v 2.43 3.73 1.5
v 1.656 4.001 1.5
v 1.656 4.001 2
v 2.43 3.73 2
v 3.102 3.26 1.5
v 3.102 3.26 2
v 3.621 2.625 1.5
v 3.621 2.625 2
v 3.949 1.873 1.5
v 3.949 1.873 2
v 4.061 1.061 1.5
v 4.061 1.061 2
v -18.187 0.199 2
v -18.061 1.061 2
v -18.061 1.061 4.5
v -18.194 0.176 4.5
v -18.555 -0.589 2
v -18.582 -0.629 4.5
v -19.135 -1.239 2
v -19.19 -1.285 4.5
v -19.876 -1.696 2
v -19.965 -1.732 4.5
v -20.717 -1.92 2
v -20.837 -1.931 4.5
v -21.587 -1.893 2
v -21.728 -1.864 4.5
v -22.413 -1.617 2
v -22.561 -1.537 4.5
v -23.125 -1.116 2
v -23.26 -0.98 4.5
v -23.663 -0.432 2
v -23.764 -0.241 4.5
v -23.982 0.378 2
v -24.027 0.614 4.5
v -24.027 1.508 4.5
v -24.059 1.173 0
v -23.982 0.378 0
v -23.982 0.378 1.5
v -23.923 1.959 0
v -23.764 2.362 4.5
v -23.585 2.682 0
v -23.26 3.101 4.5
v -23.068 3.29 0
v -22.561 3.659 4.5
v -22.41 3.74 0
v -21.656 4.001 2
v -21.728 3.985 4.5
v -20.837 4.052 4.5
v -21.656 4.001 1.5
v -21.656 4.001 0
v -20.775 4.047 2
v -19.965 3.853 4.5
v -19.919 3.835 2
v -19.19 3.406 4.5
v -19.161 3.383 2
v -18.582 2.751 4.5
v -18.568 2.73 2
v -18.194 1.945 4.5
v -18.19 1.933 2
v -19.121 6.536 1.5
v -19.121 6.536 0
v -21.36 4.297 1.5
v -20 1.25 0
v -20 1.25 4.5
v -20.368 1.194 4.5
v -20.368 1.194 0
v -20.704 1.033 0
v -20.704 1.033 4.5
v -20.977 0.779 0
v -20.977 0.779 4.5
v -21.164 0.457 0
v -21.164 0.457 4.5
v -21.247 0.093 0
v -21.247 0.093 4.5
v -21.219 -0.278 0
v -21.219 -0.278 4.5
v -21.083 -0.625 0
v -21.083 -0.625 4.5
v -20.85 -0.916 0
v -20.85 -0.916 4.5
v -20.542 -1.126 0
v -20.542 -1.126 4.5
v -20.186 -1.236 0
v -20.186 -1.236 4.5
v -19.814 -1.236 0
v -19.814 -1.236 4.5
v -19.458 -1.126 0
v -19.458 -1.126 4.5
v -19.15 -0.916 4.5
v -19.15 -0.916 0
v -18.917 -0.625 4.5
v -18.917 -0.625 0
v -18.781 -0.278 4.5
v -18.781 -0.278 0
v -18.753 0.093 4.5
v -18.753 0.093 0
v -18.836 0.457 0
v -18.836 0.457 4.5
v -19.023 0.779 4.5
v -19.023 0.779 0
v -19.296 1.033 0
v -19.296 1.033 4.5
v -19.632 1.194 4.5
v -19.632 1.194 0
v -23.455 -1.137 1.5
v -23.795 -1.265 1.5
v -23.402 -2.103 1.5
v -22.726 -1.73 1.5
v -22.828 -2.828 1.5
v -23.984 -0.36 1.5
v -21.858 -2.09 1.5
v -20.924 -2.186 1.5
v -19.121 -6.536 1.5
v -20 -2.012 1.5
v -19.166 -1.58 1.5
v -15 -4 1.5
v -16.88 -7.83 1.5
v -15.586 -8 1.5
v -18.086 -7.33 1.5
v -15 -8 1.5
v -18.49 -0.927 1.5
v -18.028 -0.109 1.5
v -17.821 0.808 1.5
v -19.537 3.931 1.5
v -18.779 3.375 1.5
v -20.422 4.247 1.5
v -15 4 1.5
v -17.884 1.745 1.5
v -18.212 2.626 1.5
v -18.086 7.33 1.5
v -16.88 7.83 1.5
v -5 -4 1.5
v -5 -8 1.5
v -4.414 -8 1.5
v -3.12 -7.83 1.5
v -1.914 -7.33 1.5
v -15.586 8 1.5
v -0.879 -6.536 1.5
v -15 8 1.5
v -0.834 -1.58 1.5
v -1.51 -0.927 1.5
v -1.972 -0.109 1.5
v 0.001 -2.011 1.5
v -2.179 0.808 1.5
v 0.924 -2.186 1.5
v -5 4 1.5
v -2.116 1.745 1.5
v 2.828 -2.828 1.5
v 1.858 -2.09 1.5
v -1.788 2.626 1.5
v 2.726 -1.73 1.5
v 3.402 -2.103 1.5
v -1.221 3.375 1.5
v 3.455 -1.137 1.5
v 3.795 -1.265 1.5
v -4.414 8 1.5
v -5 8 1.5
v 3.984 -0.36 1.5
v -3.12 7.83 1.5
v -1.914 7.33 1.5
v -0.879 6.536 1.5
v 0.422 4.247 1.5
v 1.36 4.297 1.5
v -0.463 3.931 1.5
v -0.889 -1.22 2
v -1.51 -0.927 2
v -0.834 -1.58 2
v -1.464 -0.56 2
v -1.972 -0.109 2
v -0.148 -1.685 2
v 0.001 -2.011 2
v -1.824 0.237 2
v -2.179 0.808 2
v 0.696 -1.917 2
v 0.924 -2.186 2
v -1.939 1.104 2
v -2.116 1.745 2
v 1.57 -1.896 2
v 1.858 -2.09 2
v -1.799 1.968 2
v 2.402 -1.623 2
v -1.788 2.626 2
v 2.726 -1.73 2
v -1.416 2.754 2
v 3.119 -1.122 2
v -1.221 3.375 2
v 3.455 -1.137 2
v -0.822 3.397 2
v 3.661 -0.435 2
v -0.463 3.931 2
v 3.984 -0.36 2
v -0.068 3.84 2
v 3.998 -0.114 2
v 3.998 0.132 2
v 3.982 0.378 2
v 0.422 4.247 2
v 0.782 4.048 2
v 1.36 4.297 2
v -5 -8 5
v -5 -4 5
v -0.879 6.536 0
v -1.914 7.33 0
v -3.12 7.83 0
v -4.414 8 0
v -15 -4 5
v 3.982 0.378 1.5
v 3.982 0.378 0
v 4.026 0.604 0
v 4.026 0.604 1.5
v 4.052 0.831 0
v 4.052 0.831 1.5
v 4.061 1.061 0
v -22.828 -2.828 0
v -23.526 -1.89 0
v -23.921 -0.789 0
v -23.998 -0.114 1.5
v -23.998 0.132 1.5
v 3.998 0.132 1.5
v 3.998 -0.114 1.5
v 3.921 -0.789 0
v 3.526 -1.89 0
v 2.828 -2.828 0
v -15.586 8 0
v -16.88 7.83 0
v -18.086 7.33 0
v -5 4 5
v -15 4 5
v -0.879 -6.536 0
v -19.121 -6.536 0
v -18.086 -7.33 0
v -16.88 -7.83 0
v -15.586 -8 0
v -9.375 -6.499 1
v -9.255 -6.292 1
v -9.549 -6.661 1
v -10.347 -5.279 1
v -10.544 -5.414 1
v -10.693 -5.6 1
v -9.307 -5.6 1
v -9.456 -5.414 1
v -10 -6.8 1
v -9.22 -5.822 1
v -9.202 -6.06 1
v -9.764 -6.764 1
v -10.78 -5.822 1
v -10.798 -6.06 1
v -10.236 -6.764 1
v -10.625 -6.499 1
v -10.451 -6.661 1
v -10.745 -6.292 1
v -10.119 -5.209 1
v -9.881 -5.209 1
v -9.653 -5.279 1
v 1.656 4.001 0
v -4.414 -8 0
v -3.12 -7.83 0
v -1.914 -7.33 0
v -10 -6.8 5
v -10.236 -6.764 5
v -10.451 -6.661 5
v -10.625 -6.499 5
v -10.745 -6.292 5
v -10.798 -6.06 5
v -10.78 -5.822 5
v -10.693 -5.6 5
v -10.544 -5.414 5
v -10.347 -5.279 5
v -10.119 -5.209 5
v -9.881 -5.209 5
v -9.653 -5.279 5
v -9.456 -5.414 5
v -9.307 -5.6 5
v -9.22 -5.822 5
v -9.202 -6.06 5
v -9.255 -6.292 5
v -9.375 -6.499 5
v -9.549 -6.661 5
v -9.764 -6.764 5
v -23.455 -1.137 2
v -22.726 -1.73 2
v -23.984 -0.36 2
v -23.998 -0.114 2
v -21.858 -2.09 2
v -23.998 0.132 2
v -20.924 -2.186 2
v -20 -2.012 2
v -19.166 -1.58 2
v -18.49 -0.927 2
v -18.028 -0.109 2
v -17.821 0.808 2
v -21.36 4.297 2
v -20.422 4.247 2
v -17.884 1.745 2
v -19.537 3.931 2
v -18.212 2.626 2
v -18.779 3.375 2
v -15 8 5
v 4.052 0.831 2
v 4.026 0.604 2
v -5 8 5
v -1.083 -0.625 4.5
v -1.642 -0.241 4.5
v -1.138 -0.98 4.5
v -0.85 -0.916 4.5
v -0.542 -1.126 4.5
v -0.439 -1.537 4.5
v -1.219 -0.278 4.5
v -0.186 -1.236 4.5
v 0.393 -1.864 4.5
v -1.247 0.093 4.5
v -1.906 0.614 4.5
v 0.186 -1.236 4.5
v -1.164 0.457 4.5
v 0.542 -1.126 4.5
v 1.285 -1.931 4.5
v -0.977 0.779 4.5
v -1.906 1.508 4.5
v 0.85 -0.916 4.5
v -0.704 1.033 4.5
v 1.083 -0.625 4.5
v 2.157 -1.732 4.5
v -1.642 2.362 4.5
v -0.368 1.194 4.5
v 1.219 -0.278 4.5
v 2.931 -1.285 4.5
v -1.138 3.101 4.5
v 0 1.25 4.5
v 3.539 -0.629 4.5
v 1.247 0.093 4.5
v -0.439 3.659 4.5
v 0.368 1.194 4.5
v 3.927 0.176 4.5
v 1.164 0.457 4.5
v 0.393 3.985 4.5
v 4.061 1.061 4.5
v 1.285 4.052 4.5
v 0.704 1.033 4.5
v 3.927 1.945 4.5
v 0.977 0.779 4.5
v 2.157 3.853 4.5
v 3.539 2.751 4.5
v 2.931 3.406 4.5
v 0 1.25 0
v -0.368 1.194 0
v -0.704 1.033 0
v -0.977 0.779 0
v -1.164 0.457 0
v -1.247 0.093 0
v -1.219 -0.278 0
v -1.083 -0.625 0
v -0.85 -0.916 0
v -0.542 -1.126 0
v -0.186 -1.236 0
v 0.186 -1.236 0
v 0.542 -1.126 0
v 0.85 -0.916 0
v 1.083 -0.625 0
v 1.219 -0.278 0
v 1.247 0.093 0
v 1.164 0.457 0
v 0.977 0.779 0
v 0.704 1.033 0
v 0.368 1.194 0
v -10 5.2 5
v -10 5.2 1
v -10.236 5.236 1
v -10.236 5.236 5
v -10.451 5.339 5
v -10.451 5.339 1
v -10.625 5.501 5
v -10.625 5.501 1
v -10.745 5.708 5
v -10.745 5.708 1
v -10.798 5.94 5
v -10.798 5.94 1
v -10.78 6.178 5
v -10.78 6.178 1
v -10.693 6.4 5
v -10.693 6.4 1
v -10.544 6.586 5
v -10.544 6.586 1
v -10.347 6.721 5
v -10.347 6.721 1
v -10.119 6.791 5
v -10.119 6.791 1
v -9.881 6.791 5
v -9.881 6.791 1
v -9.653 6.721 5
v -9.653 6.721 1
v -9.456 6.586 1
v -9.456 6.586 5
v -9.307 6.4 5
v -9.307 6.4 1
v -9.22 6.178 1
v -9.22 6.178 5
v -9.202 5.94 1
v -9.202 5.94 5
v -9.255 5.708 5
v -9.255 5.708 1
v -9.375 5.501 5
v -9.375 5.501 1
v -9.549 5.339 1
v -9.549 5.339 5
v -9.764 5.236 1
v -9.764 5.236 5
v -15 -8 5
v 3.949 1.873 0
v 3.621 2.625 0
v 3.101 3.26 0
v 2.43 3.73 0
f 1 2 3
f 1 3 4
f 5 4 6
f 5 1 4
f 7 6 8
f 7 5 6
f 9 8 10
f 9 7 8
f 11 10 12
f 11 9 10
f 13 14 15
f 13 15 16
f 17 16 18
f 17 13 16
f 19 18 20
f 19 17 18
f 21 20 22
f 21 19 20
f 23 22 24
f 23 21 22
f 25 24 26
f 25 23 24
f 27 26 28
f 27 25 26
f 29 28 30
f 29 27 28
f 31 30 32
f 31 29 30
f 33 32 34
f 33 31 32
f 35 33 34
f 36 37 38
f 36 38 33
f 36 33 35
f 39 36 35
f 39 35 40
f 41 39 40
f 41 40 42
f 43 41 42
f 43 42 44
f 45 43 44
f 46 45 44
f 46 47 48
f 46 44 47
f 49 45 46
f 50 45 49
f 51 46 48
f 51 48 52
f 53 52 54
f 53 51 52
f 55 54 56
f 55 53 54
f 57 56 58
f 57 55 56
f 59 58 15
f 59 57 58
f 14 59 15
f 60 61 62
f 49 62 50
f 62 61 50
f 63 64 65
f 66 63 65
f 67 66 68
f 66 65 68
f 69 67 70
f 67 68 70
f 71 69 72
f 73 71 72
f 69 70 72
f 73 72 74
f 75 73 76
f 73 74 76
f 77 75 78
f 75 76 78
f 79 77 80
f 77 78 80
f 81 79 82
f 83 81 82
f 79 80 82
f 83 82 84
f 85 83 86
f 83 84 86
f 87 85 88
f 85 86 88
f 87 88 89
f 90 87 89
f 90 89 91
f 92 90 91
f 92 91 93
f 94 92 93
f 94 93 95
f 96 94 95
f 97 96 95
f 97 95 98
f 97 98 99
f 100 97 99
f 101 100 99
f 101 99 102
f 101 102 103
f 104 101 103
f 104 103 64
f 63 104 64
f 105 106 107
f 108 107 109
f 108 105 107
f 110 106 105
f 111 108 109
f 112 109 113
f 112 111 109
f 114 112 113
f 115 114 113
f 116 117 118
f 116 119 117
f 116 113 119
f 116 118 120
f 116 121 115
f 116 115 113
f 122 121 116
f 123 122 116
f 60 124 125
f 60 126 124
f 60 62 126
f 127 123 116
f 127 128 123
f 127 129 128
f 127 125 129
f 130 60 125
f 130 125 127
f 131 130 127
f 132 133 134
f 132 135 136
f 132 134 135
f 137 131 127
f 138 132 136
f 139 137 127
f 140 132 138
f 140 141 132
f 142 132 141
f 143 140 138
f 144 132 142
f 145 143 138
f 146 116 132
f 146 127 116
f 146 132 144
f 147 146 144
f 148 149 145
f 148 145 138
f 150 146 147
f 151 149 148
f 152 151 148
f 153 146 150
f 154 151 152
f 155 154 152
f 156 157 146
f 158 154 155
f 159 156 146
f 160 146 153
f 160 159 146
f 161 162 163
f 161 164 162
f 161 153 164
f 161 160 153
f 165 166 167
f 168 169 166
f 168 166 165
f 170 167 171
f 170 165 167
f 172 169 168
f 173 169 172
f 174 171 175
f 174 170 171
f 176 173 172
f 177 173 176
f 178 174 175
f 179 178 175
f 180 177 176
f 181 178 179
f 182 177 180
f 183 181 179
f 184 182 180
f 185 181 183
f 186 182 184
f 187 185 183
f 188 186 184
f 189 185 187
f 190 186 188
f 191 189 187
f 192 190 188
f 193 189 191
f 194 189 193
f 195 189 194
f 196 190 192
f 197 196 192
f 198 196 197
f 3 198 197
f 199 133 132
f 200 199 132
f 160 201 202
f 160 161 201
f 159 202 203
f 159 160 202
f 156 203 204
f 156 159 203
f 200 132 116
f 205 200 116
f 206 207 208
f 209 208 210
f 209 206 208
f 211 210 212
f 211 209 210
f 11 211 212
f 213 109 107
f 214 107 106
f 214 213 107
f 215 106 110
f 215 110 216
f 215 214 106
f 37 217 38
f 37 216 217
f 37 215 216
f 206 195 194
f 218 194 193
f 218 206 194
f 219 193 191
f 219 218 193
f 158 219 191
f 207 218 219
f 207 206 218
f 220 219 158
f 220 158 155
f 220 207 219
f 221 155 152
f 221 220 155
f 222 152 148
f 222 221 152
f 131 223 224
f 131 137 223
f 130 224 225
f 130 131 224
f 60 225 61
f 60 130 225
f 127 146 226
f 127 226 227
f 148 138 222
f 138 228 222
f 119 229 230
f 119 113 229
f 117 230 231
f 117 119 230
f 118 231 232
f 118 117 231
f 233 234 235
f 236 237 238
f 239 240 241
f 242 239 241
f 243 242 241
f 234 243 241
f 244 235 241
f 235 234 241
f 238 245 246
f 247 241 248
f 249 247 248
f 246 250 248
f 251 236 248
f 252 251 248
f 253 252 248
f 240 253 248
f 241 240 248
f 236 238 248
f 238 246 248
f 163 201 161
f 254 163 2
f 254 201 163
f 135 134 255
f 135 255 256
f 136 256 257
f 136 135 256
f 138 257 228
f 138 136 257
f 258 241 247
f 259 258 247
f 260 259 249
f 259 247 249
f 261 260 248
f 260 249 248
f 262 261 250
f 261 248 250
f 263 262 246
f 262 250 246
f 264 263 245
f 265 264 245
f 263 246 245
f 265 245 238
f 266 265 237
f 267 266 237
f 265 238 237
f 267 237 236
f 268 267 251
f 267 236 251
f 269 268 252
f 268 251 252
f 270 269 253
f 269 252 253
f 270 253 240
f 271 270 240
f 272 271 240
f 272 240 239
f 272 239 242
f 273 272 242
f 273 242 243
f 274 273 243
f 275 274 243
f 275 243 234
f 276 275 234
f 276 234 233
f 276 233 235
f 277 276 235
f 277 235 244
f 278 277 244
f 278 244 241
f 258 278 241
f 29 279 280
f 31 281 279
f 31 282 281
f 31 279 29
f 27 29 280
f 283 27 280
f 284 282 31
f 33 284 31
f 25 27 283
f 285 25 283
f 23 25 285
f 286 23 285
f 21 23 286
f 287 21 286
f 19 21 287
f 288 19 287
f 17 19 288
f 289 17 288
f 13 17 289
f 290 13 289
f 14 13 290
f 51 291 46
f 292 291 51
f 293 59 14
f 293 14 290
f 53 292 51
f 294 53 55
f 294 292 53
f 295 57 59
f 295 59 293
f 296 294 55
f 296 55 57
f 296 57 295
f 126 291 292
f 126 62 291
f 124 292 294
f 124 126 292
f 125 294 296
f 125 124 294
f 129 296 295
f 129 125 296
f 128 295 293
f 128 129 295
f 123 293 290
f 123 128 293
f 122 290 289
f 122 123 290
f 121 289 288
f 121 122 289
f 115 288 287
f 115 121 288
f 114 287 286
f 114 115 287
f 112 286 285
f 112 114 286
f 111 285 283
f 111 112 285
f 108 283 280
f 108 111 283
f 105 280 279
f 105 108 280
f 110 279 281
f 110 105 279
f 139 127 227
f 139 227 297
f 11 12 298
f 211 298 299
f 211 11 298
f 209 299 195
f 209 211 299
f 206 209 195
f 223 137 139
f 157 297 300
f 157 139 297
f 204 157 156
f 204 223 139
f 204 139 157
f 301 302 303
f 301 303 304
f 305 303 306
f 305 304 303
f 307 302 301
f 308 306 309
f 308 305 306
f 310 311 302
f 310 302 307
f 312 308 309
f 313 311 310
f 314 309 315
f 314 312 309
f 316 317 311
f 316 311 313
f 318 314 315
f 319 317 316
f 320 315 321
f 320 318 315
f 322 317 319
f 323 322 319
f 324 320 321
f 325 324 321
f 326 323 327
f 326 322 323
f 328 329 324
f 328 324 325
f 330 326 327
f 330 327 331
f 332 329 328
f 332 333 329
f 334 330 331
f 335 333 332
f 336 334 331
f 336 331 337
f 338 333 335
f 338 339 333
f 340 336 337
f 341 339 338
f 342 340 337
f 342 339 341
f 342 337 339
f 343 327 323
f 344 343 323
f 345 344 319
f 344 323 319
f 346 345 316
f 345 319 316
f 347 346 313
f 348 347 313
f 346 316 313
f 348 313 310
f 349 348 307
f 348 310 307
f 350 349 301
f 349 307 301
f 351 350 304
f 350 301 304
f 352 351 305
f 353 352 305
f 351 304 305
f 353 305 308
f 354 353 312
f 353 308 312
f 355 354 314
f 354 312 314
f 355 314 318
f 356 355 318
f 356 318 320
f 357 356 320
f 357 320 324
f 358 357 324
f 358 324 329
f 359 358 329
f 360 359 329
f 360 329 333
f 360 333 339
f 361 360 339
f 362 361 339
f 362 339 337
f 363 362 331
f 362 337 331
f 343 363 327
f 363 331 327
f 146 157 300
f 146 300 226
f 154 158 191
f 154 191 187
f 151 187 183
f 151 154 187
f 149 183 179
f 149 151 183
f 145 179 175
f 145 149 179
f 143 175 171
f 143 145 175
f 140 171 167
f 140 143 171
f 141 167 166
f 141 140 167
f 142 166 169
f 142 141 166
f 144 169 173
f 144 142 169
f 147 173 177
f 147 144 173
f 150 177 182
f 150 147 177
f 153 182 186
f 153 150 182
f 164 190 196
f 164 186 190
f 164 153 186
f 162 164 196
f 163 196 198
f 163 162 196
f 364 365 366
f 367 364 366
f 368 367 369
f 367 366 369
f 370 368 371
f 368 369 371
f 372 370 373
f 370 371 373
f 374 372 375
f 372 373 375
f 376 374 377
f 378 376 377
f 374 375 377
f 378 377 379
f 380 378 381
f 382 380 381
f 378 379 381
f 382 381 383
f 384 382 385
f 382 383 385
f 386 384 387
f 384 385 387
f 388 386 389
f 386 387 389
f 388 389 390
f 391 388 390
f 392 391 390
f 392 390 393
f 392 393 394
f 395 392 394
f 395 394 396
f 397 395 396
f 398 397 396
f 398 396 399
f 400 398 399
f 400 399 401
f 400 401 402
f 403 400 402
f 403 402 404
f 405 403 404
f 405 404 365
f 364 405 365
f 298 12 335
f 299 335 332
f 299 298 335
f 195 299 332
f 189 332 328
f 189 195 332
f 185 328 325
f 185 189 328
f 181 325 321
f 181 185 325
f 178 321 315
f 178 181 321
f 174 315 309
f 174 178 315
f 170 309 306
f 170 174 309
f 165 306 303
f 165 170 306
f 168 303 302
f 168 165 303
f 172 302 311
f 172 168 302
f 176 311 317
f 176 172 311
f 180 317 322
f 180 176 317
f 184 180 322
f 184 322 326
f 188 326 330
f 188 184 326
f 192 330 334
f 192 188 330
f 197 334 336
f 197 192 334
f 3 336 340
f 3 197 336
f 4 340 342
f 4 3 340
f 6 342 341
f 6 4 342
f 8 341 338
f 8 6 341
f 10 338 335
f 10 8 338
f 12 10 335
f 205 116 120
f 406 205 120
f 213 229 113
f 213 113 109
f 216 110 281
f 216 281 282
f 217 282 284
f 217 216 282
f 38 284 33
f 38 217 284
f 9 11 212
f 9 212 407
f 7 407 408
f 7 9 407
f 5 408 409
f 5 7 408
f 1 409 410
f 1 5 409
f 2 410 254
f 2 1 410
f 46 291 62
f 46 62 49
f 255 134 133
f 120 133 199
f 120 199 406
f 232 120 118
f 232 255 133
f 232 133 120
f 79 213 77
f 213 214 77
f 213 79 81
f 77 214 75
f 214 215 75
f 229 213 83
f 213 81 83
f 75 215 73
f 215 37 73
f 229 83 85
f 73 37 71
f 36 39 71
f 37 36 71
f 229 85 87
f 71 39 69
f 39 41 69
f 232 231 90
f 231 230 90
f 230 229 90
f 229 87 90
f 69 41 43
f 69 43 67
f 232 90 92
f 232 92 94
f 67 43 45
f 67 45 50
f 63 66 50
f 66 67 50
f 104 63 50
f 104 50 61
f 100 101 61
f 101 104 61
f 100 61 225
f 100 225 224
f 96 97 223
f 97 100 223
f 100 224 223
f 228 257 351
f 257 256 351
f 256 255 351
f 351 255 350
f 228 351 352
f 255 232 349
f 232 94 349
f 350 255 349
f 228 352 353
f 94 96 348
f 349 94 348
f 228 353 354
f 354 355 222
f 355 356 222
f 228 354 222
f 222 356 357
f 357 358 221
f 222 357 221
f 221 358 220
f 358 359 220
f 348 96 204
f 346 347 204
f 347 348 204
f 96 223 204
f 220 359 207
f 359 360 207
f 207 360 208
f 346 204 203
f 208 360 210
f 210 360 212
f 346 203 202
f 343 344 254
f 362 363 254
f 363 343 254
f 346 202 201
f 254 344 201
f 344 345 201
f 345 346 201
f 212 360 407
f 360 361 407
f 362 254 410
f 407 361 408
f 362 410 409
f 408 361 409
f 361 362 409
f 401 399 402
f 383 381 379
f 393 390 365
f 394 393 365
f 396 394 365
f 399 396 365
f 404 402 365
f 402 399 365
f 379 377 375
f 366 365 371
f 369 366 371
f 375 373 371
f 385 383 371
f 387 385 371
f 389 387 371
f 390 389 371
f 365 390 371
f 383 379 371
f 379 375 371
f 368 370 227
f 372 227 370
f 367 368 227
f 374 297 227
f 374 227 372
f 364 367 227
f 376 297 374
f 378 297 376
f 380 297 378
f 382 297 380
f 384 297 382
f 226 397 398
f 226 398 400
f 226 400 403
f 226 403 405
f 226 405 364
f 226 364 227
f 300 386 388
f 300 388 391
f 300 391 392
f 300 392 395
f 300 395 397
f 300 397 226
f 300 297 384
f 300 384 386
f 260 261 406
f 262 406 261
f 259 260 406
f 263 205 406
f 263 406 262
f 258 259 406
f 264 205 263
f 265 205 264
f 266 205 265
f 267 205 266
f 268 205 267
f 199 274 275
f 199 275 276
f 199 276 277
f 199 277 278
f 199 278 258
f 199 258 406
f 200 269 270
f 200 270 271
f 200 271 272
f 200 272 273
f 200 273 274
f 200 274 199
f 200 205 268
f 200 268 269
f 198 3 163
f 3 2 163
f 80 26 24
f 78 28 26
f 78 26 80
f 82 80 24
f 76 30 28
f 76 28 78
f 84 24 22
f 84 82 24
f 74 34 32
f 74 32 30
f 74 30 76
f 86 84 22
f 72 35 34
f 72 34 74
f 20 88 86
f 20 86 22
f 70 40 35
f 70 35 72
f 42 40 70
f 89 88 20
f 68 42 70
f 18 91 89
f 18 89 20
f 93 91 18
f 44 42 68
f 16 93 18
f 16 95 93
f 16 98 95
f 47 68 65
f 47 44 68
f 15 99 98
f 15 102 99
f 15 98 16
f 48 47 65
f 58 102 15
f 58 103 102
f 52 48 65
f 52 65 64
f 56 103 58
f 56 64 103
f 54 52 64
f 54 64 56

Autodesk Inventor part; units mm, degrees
ref_plane "YZ Plane" through (0, 0, 0) normal (1, 0, 0) x (0, 1, 0)
ref_plane "XZ Plane" through (0, 0, 0) normal (0, 1, 0) x (-1, 0, 0)
ref_plane "XY Plane" through (0, 0, 0) normal (0, 0, 1) x (1, 0, 0)
sketch "axes" plane through (0, 0, 0) normal (0, 0, 1) x (1, 0, 0)
  point P0 (0, 0)
  point P1 (0, 0)
  point P2 (-20, 0)
  dimension "d0" = 20
sketch "Sketch2" plane through (0, 0, 0) normal (0, 0, 1) x (1, 0, 0)
  circle A0 centre (-20, 0) radius 4
  circle A1 centre (0, 0) radius 4
  line L0 (-17.6569, 8) -> (-2.3431, 8)
  line L1 (-2.3431, -8) -> (-17.6569, -8)
  line L2 (-17.6569, -8) -> (-22.8284, -2.8284)
  line L3 (-17.6569, 8) -> (-22.8284, 2.8284)
  line L4 (-2.3431, 8) -> (2.8284, 2.8284)
  line L5 (-2.3431, -8) -> (2.8284, -2.8284)
  line L6 (-20, 0) -> (0, 0) construction
  dimension "d1" = 8
  dimension "d2" = 8
  dimension "d3" = 16
  dimension "d4" = 45
  dimension "d5" = 45
extrude "baseplate" add sketch "Sketch2" along normal blind 1.5
sketch "Sketch3" plane through (0, 0, 1.5) normal (0, 0, 1) x (1, 0, 0)
  arc A0 (-22.8284, 2.8284) -> (-22.8284, -2.8284) centre (-20, 0) ccw projected
  line L0 (-22.8284, -2.8284) -> (-17.6569, -8) projected
  line L1 (-17.6569, -8) -> (-2.3431, -8) projected
  line L2 (-2.3431, -8) -> (2.8284, -2.8284) projected
  arc A1 (2.8284, -2.8284) -> (2.8284, 2.8284) centre (0, 0) ccw projected
  line L3 (2.8284, 2.8284) -> (-2.3431, 8) projected
  line L4 (-2.3431, 8) -> (-17.6569, 8) projected
  line L5 (-17.6569, 8) -> (-22.8284, 2.8284) projected
  line L6 (-15, 8) -> (-5, 8)
  line L7 (-5, 8) -> (-5, 4)
  line L8 (-5, 4) -> (-15, 4)
  line L9 (-15, 4) -> (-15, 8)
  line L10 (-15, -8) -> (-5, -8)
  line L11 (-5, -8) -> (-5, -4)
  line L12 (-5, -4) -> (-15, -4)
  line L13 (-15, -4) -> (-15, -8)
  dimension "d8" = 4
  dimension "d9" = 4
  dimension "d10" = 5
  dimension "d11" = 5
  dimension "d12" = 5
  dimension "d13" = 5
extrude "walls" add sketch "Sketch3" along normal blind 3.5 contours L4 L7 L8 L9 | L13 L12 L11 L1
sketch "Sketch5" plane through (0, 0, 5) normal (0, 0, 1) x (1, 0, 0)
  line L0 (-15, -8) -> (-5, -8) projected
  line L1 (-5, -8) -> (-5, -4) projected
  line L2 (-5, -4) -> (-15, -4) projected
  line L3 (-15, -4) -> (-15, -8) projected
  line L4 (-15, 8) -> (-15, 4) projected
  line L5 (-15, 4) -> (-5, 4) projected
  line L6 (-5, 4) -> (-5, 8) projected
  line L7 (-5, 8) -> (-15, 8) projected
  line L8 (-5, -6) -> (-15, -6) construction
  line L9 (-5, 6) -> (-15, 6) construction
  point P0 (0, 0)
  point P1 (-10, -6)
  point P2 (-10, 6)
hole "mounting" at (-10, -6, 5) at (-10, 6, 5) direction (0, 0, -1) diameter 1.6 depth 4
sketch "Sketch6" plane through (0, 0, 1.5) normal (0, 0, 1) x (1, 0, 0)
  circle A0 centre (1.0607, 1.0607) radius 3
  line L0 (0, 0) -> (1.0607, 1.0607) construction
  line L1 (0, 0) -> (7.1773, 0) construction
  dimension "d30" = 45
  dimension "d31" = 1.5
  dimension "d32" = 6
extrude "pip springy" add sketch "Sketch6" along normal blind 3 and the other way blind 1.5
sketch "Sketch10" plane through (0, 0, 1.5) normal (0, 0, 1) x (1, 0, 0)
  circle A0 centre (1.0607, 1.0607) radius 3 projected
  line L0 (1.6558, 4.001) -> (-2.3431, 8) projected
  arc A1 (2.8284, -2.8284) -> (3.9821, 0.3784) centre (0, 0) ccw projected
  arc A2 (1.36, 4.2968) -> (3.9838, -0.3599) centre (1.0607, 1.0607) ccw
  dimension "d50" = 6.5
extrude "Extrusion7" add sketch "Sketch10" along normal blind 0.5
sketch "Sketch8" plane through (0, 0, 1.5) normal (0, 0, 1) x (1, 0, 0)
  line L0 (-25.1045, 0) -> (-20, 0) construction
  line L1 (-20, 0) -> (-24.2709, 4.2709) construction
  circle A0 centre (-21.0607, 1.0607) radius 3
  point P0 (0, 0)
  dimension "d38" = 45
  dimension "d39" = 6
  dimension "d40" = 1.5
extrude "dip springy" add sketch "Sketch8" along normal blind 3 and the other way blind 1.5
sketch "Sketch9" plane through (0, 0, 1.5) normal (0, 0, 1) x (1, 0, 0)
  arc A0 (-23.9821, 0.3784) -> (-21.6558, 4.001) centre (-21.0607, 1.0607) ccw projected
  arc A1 (-23.9838, -0.3599) -> (-21.36, 4.2968) centre (-21.0607, 1.0607) ccw
  line L0 (-17.6569, 8) -> (-21.6558, 4.001) projected
  arc A2 (-23.9821, 0.3784) -> (-22.8284, -2.8284) centre (-20, 0) ccw projected
  point P0 (0, 0)
  dimension "d43" = 6.5
extrude "Extrusion6" add sketch "Sketch9" along normal blind 0.5
sketch "Sketch4" plane through (0, 0, 0) normal (0, 0, -1) x (-1, 0, 0)
  point P0 (20, 0)
  point P1 (0, 0)
hole "joints" at (0, 0, 0) at (-20, 0, 0) direction (0, 0, 1) diameter 2.5 end through all
fillet "Fillet1" radius 5 4 edges at (-2.3431, -8, 0.75) (-17.6569, -8, 0.75) (-17.6569, 8, 0.75) (-2.3431, 8, 0.75)
equation "\"d0\" = PIP_DIP_length"
equation "\"d31\" = PIP_spring_arm"
equation "\"d40\" = DIP_spring_arm"
equation "\"PIP_DIP_length\" = F5_PIP_DIP_length"
equation "\"PIP_spring_arm\" = F5_PIP_spring_arm"
equation "\"DIP_spring_arm\" = F5_DIP_spring_arm"
equation "\"F5_PIP_DIP_length\" = 20"
equation "\"F5_PIP_spring_arm\" = 1.5"
equation "\"F5_DIP_spring_arm\" = 1.5"
properties part number "phalanx 2 R F5"
